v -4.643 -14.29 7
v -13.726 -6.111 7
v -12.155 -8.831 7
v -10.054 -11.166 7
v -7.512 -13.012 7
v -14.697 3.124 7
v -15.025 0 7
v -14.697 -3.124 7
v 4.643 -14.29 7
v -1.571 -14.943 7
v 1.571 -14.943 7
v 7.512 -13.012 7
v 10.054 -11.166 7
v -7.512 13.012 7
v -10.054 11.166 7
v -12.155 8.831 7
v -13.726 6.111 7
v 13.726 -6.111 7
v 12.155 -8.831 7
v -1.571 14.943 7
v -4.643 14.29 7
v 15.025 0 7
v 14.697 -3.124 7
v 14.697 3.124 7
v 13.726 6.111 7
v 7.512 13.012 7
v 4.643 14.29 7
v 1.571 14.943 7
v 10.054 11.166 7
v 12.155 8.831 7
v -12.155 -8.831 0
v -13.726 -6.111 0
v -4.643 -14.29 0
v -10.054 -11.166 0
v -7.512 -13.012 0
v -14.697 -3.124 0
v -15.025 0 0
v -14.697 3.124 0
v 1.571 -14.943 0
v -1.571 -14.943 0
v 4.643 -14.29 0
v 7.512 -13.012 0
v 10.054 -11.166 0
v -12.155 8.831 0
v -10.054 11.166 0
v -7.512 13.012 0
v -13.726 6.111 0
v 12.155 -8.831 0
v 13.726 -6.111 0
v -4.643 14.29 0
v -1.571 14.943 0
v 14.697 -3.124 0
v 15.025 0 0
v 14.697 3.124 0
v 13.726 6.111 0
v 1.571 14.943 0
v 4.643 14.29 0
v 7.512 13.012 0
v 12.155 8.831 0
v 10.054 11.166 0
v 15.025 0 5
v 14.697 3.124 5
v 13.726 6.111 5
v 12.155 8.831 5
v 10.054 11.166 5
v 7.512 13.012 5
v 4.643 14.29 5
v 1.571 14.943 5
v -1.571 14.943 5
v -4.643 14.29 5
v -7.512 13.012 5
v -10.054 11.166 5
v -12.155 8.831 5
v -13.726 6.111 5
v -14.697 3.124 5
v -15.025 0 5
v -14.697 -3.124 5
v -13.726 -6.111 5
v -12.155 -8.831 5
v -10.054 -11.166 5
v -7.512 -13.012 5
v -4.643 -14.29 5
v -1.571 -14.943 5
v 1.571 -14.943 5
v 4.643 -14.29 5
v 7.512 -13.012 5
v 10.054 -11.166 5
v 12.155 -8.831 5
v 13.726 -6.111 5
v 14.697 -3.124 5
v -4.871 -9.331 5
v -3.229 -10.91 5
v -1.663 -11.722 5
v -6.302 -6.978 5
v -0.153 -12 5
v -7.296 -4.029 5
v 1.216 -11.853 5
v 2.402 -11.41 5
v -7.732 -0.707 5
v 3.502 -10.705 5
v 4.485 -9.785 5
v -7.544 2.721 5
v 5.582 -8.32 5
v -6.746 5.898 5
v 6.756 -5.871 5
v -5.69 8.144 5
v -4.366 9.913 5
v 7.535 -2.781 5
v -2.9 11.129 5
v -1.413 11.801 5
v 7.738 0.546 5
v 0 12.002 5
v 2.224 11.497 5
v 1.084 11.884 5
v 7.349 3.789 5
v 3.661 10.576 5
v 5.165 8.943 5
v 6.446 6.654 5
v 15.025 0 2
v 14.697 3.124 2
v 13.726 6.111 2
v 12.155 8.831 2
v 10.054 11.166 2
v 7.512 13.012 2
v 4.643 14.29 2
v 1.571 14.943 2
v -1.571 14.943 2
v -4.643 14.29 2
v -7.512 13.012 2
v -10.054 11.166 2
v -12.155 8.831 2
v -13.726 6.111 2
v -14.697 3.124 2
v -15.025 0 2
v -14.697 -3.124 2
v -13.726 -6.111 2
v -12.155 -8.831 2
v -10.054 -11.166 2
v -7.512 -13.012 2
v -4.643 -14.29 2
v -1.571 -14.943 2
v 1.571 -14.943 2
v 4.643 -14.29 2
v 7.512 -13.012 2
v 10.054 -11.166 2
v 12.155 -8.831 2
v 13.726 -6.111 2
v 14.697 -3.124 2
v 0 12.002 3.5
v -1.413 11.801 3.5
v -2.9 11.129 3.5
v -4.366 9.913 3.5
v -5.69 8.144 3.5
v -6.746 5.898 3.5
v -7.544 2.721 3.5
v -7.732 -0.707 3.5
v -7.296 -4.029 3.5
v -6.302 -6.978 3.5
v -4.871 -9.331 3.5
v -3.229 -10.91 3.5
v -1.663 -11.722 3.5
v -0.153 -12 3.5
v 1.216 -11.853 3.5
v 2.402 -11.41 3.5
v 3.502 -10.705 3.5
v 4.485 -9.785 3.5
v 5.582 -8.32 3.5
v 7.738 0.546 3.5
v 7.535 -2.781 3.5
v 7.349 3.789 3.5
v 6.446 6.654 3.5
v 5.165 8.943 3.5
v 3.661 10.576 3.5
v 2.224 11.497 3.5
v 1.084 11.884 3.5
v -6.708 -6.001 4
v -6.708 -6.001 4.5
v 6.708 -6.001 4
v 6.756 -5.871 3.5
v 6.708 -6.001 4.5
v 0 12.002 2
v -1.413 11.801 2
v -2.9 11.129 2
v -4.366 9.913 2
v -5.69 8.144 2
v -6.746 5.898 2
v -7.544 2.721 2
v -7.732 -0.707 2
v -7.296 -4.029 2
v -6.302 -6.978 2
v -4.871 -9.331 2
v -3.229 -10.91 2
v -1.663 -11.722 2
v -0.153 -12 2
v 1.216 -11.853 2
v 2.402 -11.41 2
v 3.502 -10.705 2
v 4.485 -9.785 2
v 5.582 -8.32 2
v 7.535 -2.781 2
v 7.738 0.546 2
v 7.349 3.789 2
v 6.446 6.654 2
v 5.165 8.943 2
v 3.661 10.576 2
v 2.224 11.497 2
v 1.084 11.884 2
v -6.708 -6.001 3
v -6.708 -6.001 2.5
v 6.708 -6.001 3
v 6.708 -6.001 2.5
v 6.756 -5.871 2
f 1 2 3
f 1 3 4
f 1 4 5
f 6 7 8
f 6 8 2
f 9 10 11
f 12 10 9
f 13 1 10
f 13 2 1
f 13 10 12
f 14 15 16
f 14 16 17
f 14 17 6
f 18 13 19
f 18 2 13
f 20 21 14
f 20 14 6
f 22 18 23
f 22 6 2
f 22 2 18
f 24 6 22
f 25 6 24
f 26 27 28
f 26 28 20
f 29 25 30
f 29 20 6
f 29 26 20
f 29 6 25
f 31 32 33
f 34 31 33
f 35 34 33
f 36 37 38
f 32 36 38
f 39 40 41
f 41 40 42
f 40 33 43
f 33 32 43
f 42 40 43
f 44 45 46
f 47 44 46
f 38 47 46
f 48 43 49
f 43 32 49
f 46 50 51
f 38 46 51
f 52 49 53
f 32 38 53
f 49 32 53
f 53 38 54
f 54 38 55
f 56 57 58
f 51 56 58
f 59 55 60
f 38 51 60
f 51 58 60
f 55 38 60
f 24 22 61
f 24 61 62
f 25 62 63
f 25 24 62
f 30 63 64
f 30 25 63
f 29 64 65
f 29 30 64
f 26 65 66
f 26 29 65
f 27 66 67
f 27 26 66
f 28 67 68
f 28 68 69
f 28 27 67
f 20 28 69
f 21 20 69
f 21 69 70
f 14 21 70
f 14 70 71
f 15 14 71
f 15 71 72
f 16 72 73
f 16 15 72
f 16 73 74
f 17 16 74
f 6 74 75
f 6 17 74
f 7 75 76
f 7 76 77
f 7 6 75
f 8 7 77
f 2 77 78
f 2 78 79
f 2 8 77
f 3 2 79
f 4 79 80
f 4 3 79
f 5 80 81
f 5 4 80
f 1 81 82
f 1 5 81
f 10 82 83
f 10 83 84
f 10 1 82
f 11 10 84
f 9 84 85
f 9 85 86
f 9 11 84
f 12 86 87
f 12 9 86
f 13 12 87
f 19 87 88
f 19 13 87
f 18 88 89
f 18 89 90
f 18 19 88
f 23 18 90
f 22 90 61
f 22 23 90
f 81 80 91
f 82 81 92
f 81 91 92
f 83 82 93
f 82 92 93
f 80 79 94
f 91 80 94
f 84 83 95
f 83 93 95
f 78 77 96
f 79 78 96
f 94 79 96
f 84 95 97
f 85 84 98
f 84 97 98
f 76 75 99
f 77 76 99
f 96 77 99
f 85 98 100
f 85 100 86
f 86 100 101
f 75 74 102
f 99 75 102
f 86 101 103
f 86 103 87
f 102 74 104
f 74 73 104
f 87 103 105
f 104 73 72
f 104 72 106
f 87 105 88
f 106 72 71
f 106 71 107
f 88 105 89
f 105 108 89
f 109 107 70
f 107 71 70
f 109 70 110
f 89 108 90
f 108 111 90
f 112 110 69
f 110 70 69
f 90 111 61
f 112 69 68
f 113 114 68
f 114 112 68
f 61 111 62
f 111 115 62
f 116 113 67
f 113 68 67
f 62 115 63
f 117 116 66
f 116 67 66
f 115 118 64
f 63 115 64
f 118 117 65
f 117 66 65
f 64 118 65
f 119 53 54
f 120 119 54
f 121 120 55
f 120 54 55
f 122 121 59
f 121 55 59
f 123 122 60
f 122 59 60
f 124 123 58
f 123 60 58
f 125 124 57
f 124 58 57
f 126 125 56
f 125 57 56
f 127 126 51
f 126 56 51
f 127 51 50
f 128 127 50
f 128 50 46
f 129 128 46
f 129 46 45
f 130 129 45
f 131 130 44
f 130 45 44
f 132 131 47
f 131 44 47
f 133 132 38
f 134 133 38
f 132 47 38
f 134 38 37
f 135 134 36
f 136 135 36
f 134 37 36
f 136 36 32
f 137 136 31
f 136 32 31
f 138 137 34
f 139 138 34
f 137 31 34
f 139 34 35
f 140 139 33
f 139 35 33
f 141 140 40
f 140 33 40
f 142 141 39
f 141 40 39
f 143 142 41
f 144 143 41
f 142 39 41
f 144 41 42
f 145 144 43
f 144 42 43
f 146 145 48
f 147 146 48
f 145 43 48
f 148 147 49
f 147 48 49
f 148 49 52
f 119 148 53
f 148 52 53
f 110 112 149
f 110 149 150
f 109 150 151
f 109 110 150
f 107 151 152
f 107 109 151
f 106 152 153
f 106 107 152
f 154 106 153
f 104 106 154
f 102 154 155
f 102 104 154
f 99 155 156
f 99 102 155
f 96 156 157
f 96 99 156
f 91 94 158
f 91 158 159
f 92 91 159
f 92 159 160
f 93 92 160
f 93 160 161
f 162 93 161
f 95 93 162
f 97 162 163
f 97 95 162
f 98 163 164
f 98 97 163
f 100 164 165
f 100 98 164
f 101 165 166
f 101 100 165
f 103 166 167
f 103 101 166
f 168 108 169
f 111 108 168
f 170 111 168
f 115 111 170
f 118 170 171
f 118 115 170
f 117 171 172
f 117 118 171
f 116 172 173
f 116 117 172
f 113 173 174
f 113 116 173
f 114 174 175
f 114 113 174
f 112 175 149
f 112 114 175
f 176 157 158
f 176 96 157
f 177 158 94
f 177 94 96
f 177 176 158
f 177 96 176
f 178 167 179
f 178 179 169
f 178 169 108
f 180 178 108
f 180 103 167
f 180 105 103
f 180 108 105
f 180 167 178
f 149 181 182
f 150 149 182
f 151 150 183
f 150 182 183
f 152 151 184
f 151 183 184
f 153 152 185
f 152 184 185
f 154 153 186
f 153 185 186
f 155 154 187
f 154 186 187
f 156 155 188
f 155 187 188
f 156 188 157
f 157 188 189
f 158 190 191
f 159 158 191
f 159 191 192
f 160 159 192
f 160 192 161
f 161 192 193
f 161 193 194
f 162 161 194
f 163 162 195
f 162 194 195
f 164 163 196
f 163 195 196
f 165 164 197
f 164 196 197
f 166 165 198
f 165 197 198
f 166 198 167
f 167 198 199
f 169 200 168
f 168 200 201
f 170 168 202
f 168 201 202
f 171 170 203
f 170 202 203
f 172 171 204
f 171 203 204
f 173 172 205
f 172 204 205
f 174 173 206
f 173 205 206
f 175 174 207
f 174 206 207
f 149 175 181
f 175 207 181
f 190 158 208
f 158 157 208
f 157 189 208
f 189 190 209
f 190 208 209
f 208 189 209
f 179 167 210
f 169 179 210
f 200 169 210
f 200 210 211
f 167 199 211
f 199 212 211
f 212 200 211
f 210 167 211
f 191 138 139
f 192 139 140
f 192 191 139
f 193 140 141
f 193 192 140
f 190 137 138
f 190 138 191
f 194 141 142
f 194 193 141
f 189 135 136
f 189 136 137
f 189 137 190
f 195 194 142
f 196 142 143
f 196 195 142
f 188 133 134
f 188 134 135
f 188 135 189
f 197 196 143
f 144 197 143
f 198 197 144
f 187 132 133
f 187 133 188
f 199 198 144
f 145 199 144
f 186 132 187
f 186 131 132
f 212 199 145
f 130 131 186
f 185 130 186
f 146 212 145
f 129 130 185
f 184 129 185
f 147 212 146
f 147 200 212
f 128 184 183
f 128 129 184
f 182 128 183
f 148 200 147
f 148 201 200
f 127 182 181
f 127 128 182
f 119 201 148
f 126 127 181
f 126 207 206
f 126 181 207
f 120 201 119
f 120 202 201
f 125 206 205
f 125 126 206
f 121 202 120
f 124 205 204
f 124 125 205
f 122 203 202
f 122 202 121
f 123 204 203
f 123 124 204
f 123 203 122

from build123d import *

# Parameters (mm, degrees)
F0_R     = 15.02497
F1_DEPTH = 2
F3_DEPTH = 1.5


with BuildPart() as f1:
    # F0 (on Top) → F1 (new body)
    with BuildSketch(Plane.XY):
        Circle(F0_R)
    extrude(amount=F1_DEPTH)

    # F2 (on face) → F3 (join)
    with BuildSketch(Plane.XY.offset(2)):
        with BuildLine():
            add(Edge.make_bspline(
                [(0, 12.001941), (-13.415678, 12.001941), (-6.707839, -6.00097), (0, -24.003882), (6.707839, -6.00097), (13.415678, 12.001941), (0, 12.001941)],
                knots=[0, 0, 0, 2.094395, 2.094395, 4.18879, 4.18879, 6.283185, 6.283185, 6.283185], degree=2, weights=[1, 0.5, 1, 0.5, 1, 0.5, 1]))
        make_face()
    extrude(amount=F3_DEPTH)

    # F5: F1 across plane


with BuildPart() as f1_1:
    add(f1.part)
    add(f1.part.mirror(Plane.XY.offset(3.5)))


solid = f1_1.part
